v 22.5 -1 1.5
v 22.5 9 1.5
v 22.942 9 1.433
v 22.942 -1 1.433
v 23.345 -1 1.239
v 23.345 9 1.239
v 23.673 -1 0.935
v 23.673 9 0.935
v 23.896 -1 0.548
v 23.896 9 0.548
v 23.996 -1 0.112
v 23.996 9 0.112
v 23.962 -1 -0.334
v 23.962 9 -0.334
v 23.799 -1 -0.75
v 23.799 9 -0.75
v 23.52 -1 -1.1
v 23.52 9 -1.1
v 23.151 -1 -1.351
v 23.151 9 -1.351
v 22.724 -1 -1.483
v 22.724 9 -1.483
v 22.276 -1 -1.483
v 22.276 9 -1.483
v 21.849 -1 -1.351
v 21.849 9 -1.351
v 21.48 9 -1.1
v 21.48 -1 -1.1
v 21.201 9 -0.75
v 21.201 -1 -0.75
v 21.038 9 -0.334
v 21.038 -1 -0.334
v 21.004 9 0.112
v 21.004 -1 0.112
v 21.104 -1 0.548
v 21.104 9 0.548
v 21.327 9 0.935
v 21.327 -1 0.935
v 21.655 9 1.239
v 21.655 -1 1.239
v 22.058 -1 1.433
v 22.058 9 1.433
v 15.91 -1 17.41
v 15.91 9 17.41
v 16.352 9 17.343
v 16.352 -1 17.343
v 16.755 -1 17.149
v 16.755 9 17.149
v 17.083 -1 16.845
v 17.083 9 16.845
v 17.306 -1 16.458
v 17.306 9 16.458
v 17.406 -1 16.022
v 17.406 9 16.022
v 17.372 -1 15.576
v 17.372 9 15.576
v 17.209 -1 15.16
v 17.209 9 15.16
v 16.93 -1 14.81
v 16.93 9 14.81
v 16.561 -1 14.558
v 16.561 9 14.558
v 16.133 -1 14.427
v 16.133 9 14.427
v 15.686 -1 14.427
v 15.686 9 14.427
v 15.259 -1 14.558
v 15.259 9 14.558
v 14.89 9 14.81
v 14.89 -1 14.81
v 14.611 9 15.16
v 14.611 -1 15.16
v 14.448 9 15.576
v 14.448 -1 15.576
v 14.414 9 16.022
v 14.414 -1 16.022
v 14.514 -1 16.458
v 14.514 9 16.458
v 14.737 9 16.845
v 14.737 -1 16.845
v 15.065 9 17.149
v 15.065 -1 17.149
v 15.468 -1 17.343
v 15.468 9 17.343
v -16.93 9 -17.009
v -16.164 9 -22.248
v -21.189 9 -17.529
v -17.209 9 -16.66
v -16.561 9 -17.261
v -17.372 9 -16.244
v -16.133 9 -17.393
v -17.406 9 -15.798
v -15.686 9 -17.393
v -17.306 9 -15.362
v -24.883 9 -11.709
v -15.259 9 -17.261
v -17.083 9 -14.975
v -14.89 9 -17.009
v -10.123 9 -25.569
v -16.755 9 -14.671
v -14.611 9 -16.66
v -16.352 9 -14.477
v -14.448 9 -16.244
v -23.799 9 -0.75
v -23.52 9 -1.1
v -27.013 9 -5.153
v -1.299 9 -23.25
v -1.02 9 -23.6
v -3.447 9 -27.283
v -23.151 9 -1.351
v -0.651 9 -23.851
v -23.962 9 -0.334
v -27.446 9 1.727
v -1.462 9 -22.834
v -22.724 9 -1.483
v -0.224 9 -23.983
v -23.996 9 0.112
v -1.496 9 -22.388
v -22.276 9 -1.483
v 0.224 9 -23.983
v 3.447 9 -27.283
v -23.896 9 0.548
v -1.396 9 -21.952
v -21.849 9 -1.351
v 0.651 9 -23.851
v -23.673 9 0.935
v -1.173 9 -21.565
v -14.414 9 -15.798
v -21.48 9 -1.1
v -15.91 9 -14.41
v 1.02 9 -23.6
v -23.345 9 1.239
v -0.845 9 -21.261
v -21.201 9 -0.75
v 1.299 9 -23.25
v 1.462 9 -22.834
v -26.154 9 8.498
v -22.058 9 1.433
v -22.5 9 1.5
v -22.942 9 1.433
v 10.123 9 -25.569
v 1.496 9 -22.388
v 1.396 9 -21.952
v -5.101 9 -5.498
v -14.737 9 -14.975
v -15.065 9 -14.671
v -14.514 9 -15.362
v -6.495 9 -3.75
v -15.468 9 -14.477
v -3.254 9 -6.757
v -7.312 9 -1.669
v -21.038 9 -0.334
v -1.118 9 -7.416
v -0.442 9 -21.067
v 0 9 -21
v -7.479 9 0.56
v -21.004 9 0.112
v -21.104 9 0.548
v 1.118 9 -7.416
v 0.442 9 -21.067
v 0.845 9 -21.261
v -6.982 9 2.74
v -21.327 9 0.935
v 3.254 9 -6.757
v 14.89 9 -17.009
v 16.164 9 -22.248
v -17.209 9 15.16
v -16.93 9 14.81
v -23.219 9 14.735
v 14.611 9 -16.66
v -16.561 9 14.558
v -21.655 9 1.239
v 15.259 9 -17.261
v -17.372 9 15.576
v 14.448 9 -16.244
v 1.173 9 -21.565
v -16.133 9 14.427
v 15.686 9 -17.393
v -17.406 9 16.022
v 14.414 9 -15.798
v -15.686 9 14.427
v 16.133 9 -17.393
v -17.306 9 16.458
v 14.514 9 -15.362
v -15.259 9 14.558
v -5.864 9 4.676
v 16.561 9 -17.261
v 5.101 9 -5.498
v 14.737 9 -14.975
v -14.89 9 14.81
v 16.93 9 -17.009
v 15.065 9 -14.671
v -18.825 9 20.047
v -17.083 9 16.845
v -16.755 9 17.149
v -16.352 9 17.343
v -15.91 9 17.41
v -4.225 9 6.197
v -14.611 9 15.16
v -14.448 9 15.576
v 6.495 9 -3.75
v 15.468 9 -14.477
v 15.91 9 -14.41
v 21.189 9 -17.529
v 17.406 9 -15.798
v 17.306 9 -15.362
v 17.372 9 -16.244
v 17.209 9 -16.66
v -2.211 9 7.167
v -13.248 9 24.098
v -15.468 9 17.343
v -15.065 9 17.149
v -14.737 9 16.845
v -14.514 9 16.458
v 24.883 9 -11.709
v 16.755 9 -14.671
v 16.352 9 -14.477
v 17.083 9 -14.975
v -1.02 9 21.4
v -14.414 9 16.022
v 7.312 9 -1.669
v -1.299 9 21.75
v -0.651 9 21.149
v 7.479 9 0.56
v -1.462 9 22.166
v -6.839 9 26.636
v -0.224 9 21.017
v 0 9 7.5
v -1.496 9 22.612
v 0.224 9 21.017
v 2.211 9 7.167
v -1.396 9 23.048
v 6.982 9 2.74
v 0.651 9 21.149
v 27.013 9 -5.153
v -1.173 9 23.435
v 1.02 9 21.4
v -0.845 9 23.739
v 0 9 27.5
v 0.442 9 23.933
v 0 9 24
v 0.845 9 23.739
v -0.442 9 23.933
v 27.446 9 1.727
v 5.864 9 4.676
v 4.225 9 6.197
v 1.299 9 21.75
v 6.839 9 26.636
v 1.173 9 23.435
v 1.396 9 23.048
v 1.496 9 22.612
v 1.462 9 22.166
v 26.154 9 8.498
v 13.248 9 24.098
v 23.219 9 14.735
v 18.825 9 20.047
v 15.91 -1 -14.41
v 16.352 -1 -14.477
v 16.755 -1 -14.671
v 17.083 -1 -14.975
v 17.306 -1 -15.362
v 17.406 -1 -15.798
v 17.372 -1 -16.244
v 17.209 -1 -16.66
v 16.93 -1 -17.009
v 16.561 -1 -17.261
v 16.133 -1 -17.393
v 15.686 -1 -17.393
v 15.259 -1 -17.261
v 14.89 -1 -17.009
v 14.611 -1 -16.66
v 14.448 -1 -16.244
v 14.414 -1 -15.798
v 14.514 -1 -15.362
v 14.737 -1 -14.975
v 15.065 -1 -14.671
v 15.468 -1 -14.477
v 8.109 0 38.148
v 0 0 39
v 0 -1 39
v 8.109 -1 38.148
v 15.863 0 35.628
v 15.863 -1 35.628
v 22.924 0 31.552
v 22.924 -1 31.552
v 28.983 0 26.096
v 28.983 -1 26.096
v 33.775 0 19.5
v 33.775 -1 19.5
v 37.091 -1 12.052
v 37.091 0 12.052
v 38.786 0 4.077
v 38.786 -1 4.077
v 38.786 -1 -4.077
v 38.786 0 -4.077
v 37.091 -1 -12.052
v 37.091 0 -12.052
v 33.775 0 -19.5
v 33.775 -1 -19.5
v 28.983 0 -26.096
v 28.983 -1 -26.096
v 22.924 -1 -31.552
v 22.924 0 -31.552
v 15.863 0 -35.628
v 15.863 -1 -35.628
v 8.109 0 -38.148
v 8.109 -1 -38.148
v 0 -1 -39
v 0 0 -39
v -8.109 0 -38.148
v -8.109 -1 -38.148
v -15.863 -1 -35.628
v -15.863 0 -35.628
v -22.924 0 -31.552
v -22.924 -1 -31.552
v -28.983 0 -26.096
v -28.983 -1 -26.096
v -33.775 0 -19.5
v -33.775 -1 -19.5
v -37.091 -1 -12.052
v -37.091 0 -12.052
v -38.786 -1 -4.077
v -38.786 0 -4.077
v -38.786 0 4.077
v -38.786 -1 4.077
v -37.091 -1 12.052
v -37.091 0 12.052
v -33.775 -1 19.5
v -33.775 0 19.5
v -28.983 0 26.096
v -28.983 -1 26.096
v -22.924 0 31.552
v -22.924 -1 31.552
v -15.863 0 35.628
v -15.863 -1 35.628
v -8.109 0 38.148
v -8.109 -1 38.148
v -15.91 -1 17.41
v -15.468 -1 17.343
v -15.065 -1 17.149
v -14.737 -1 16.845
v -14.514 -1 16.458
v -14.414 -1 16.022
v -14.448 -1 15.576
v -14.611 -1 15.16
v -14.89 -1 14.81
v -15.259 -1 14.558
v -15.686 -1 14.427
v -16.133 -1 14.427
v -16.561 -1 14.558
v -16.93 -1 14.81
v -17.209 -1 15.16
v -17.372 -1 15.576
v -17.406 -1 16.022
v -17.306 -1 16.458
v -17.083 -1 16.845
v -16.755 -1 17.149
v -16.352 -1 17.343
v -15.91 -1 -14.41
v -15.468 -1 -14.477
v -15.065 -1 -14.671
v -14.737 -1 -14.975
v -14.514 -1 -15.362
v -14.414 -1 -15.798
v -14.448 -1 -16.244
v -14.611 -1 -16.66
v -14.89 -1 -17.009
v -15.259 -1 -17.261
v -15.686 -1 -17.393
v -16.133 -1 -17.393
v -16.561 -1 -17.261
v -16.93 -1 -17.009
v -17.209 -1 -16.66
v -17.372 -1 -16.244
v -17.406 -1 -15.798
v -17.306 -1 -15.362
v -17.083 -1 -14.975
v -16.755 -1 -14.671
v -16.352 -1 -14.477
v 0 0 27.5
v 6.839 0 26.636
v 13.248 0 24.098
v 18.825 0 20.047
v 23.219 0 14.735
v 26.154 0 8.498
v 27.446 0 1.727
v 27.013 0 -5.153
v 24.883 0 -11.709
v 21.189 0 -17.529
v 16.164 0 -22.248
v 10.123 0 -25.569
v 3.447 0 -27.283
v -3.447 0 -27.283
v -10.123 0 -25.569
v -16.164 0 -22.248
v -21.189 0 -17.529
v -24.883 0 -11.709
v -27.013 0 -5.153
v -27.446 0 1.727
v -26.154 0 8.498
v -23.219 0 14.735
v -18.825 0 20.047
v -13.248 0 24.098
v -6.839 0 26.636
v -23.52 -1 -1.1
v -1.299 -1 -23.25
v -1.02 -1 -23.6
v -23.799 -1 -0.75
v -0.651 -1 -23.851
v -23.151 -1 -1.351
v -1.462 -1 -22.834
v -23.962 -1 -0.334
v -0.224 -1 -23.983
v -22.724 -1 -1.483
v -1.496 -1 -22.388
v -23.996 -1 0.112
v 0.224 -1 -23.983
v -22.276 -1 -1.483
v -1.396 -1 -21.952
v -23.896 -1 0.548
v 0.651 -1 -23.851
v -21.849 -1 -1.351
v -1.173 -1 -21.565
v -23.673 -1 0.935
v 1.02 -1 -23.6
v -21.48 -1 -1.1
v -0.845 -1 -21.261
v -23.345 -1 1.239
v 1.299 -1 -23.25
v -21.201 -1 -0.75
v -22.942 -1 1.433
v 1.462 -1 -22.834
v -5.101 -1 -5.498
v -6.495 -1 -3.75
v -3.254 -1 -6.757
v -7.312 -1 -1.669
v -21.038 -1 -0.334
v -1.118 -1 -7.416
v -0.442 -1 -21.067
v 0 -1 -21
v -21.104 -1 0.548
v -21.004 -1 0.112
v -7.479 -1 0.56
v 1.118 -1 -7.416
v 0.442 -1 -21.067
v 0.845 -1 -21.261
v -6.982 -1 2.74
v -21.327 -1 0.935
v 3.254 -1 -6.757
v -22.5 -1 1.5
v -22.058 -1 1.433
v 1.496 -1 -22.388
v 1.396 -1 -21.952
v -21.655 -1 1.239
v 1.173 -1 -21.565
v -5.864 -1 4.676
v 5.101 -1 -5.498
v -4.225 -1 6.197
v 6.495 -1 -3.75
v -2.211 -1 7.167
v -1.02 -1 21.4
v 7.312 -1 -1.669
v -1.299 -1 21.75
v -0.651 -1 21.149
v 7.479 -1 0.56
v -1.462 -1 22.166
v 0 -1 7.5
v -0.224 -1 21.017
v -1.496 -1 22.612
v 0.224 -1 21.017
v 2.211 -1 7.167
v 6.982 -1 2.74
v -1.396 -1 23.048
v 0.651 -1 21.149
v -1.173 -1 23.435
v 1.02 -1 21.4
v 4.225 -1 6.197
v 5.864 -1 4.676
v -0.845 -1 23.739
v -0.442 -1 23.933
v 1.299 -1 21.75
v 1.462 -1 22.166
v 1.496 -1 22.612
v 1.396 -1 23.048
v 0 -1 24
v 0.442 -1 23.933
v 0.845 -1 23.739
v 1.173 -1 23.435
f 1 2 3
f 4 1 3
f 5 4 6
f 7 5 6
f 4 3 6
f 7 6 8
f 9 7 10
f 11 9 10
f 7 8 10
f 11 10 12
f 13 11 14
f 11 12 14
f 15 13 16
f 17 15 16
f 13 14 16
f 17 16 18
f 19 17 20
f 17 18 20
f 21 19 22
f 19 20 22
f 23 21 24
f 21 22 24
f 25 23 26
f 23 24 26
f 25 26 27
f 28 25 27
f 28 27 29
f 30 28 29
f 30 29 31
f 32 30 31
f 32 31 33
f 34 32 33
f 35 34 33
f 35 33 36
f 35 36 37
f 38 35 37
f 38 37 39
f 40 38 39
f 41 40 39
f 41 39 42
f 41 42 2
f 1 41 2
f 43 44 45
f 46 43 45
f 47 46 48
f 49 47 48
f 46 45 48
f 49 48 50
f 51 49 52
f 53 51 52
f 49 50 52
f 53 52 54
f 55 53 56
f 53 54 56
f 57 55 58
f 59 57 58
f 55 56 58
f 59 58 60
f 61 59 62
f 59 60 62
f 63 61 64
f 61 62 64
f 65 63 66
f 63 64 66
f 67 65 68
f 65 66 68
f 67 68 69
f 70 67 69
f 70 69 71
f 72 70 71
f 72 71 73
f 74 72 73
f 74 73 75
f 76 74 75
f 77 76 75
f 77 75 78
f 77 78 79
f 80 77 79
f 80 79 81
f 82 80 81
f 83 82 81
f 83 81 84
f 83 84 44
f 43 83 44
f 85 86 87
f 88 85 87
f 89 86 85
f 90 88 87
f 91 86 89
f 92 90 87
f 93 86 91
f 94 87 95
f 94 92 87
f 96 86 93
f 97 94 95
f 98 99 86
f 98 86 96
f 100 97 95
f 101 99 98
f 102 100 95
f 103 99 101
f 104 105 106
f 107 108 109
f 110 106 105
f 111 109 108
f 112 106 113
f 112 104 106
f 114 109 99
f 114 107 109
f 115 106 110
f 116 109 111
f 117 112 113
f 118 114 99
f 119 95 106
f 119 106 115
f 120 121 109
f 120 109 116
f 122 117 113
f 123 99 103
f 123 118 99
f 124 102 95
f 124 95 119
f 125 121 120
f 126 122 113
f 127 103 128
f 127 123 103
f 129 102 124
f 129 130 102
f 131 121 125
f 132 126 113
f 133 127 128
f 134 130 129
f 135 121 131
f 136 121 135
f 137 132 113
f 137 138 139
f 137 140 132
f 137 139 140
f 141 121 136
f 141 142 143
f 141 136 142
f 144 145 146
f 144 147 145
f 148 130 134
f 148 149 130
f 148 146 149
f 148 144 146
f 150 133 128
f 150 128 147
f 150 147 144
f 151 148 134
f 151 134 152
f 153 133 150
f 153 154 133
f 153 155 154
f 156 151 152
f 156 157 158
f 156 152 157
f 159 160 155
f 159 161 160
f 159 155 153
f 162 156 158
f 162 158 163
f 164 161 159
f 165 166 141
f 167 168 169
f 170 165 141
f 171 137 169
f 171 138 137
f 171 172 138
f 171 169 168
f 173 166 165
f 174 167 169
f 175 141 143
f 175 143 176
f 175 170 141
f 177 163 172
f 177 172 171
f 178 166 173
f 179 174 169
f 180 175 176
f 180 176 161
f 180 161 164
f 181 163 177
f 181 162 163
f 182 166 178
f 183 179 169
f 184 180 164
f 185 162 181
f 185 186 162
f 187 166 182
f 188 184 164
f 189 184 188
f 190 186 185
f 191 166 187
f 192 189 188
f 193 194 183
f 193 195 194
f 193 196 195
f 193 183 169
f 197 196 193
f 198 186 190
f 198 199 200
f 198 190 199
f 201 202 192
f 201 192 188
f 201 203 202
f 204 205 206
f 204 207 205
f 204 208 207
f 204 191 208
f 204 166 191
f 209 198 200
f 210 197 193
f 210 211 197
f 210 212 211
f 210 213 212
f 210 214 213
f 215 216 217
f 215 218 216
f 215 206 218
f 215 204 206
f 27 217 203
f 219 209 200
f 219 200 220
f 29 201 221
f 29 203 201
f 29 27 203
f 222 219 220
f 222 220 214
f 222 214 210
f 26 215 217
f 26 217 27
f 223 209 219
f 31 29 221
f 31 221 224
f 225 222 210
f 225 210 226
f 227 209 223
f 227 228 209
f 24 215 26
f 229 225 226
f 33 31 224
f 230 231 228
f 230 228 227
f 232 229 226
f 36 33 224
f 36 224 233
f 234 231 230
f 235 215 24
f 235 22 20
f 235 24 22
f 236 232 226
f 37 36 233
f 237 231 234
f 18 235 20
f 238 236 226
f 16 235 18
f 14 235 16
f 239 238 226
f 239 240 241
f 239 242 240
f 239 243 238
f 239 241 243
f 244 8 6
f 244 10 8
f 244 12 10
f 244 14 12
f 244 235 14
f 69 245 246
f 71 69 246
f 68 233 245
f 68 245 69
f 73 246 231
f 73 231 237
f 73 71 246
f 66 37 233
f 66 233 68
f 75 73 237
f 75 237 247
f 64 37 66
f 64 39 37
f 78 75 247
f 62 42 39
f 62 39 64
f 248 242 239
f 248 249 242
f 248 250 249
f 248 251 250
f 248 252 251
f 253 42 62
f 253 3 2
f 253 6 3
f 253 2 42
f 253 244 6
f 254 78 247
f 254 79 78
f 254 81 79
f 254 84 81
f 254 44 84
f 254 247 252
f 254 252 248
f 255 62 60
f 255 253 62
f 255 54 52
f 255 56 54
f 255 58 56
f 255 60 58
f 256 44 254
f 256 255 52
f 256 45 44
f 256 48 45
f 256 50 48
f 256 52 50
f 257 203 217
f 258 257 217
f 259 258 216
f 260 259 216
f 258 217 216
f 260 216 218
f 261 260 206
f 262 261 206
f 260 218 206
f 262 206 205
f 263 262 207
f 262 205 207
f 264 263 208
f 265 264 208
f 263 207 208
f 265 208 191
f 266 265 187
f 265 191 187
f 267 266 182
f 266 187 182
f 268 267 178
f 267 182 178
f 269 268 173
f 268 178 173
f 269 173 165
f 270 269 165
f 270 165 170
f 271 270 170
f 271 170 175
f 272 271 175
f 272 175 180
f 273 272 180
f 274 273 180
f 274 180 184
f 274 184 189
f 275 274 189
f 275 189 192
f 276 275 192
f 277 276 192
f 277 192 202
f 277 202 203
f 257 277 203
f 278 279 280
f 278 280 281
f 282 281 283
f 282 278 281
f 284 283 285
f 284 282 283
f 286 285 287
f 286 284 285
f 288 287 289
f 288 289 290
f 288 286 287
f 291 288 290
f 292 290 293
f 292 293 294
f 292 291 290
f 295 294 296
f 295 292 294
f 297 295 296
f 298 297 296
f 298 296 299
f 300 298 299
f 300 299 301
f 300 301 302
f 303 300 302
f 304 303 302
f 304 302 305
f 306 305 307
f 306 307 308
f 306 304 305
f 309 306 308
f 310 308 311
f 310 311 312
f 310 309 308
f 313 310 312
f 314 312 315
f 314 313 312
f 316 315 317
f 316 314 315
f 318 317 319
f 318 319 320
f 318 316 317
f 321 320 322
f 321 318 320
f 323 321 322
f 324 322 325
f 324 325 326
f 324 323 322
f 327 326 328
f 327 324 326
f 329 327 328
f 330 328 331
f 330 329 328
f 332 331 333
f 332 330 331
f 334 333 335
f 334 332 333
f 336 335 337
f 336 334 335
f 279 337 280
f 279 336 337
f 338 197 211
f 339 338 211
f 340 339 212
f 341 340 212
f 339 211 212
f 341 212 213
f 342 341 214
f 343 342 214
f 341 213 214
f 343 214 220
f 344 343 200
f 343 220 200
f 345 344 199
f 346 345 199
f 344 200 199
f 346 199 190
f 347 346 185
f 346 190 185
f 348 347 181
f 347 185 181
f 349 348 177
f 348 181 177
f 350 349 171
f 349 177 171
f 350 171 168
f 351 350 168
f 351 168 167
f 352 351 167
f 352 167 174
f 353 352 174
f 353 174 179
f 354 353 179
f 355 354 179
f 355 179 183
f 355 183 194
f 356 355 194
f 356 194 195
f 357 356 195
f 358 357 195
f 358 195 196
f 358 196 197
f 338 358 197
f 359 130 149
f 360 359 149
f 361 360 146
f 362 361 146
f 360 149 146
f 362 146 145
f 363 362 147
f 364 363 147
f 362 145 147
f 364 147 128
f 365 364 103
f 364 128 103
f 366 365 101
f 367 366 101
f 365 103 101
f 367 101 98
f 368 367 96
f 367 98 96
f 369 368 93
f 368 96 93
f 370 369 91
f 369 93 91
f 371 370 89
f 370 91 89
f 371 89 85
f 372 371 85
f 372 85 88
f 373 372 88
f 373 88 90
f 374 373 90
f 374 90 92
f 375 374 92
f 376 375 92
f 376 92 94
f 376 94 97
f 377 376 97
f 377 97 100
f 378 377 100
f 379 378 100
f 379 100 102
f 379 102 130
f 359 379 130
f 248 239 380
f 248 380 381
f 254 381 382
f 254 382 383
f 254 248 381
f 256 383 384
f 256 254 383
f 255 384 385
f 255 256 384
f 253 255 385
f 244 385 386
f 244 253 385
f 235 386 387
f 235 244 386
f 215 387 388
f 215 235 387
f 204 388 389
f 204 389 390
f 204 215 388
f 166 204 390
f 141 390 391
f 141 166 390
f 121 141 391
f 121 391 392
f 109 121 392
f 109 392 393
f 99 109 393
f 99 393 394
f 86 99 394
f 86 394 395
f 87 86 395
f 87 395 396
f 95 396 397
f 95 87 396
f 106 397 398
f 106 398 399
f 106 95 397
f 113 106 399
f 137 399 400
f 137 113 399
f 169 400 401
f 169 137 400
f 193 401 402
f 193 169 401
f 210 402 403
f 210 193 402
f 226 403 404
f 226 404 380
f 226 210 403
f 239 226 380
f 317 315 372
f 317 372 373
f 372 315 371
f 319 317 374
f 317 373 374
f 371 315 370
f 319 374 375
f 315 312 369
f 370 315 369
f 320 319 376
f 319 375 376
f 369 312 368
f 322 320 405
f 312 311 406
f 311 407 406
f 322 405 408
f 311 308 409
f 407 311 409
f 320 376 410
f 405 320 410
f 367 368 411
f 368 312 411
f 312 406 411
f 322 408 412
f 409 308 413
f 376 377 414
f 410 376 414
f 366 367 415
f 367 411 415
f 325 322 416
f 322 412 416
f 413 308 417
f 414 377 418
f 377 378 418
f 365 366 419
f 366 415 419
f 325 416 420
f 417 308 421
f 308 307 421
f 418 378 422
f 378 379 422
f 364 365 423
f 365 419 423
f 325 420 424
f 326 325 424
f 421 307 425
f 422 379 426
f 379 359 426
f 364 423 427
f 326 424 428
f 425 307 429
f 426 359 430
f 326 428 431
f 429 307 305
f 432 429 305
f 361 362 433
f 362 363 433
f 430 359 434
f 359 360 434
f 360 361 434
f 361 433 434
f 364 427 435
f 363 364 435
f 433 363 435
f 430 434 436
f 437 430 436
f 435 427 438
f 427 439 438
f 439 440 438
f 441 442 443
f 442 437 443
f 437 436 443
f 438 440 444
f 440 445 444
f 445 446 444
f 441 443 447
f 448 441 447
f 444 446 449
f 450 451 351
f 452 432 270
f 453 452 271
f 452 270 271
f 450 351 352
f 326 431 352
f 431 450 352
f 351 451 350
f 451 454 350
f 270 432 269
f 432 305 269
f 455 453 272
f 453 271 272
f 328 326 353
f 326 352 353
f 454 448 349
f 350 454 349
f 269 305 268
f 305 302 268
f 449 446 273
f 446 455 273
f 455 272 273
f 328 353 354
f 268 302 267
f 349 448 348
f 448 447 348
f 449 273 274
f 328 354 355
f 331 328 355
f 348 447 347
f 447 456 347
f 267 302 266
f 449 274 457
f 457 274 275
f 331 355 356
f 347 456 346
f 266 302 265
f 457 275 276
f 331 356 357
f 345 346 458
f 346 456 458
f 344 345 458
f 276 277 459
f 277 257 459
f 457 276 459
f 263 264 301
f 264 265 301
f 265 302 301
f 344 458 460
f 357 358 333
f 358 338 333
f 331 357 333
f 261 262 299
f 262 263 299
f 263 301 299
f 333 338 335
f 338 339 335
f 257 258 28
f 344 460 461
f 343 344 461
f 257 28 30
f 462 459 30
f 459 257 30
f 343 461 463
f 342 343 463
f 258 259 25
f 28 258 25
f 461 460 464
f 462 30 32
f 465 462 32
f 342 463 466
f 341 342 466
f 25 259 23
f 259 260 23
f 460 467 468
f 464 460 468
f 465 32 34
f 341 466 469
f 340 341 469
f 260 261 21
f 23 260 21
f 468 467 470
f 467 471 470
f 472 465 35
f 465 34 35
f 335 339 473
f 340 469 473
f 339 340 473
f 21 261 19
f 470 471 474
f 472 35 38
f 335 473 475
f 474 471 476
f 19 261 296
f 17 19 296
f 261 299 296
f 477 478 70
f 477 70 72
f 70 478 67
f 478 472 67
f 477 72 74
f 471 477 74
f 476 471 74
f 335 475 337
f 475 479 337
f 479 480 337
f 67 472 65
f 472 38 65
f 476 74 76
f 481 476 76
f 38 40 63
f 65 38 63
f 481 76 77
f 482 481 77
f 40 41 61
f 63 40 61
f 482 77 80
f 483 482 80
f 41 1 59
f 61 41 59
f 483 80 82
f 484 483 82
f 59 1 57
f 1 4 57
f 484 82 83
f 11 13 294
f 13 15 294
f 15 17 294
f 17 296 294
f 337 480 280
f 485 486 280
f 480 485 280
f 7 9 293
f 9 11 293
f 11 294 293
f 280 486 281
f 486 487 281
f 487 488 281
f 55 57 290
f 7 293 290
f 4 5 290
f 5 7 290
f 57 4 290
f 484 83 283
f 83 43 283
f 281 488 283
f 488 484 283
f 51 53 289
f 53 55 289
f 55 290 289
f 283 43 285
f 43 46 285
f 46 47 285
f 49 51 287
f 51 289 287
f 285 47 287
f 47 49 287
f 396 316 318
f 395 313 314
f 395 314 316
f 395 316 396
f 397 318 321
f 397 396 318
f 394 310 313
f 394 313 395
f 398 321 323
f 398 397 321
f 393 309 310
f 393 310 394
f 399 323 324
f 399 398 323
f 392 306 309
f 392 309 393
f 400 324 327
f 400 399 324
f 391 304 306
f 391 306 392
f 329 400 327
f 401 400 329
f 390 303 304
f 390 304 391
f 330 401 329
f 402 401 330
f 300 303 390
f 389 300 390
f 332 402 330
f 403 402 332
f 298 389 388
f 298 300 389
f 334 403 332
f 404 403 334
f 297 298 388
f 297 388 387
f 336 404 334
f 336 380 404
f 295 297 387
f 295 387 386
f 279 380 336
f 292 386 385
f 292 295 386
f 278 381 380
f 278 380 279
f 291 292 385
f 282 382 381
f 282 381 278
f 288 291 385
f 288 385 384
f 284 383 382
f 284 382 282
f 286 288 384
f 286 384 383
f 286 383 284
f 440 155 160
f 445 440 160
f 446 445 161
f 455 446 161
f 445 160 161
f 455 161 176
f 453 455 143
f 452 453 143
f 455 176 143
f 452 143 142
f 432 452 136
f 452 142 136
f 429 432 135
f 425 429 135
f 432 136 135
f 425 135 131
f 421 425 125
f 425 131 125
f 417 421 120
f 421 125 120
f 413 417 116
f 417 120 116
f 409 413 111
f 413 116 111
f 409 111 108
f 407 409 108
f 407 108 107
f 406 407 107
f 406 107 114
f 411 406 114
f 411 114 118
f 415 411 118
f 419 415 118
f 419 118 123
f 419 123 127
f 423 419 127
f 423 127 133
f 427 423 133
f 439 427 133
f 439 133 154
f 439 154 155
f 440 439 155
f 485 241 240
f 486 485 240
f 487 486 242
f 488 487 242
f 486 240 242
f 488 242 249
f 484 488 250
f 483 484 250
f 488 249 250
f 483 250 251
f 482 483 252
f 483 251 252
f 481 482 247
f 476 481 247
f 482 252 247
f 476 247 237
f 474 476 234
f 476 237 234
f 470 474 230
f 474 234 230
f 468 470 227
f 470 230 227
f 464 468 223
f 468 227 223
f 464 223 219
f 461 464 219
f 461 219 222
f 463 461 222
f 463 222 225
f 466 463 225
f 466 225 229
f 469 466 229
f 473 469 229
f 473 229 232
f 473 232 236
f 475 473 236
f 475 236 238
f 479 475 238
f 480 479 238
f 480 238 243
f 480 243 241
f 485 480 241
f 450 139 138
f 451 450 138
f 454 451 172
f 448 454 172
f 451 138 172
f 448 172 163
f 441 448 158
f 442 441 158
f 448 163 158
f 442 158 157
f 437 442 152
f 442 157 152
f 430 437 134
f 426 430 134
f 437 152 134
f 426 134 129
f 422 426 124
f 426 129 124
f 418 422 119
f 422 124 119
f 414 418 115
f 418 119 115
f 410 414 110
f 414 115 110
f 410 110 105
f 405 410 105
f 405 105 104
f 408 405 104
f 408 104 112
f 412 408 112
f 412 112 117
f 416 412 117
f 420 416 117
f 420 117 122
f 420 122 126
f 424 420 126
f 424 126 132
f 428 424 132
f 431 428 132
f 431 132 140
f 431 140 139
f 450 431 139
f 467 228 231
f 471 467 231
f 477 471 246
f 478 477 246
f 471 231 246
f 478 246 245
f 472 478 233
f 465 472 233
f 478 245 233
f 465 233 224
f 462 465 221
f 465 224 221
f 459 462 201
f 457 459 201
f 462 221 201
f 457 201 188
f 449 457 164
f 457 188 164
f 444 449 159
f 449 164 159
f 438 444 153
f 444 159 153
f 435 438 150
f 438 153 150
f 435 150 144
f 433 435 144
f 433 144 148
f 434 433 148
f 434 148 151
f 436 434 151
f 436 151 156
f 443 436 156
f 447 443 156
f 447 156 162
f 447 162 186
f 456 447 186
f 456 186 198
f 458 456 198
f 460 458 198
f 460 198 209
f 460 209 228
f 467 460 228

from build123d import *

# Parameters (mm, degrees)
SKETCH1_R           = 39
SKETCH1_R_2         = 1.5
SKETCH1_R_3         = 7.5
BOSS_EXTRUDE1_DEPTH = 1
BOSS_EXTRUDE2_START = 9
SKETCH1_3_R         = 27.5
SKETCH1_3_R_2       = 1.5
SKETCH1_3_R_3       = 7.5
BOSS_EXTRUDE2_DEPTH = 9


with BuildPart() as part:
    # Sketch1 → Boss-Extrude1 (new body)
    with BuildSketch(Plane(origin=(0, 0, 0), x_dir=(1, 0, 0), z_dir=(0, 1, 0))):
        Circle(SKETCH1_R)
        with Locations((22.5, 0)):
            Circle(SKETCH1_R_2, mode=Mode.SUBTRACT)
        with Locations((-15.909902577, -15.909902577)):
            Circle(SKETCH1_R_2, mode=Mode.SUBTRACT)
        with Locations((0, -22.5)):
            Circle(SKETCH1_R_2, mode=Mode.SUBTRACT)
        with Locations((15.909902577, -15.909902577)):
            Circle(SKETCH1_R_2, mode=Mode.SUBTRACT)
        with Locations((-22.5, 0)):
            Circle(SKETCH1_R_2, mode=Mode.SUBTRACT)
        with Locations((-15.909902577, 15.909902577)):
            Circle(SKETCH1_R_2, mode=Mode.SUBTRACT)
        with Locations((0, 22.5)):
            Circle(SKETCH1_R_2, mode=Mode.SUBTRACT)
        Circle(SKETCH1_R_3, mode=Mode.SUBTRACT)
        with Locations((15.909902577, 15.909902577)):
            Circle(SKETCH1_R_2, mode=Mode.SUBTRACT)
    extrude(amount=-BOSS_EXTRUDE1_DEPTH)

    # Sketch1<3> → Boss-Extrude2 (add)
    with BuildSketch(Plane(origin=(0, 0, 0), x_dir=(1, 0, 0), z_dir=(0, 1, 0)).offset(BOSS_EXTRUDE2_START)):
        Circle(SKETCH1_3_R)
        with Locations((-15.909902577, -15.909902577)):
            Circle(SKETCH1_3_R_2, mode=Mode.SUBTRACT)
        with Locations((0, -22.5)):
            Circle(SKETCH1_3_R_2, mode=Mode.SUBTRACT)
        with Locations((15.909902577, -15.909902577)):
            Circle(SKETCH1_3_R_2, mode=Mode.SUBTRACT)
        with Locations((-22.5, 0)):
            Circle(SKETCH1_3_R_2, mode=Mode.SUBTRACT)
        with Locations((-15.909902577, 15.909902577)):
            Circle(SKETCH1_3_R_2, mode=Mode.SUBTRACT)
        with Locations((0, 22.5)):
            Circle(SKETCH1_3_R_2, mode=Mode.SUBTRACT)
        Circle(SKETCH1_3_R_3, mode=Mode.SUBTRACT)
        with Locations((15.909902577, 15.909902577)):
            Circle(SKETCH1_3_R_2, mode=Mode.SUBTRACT)
        with Locations((22.5, 0)):
            Circle(SKETCH1_3_R_2, mode=Mode.SUBTRACT)
    extrude(amount=-BOSS_EXTRUDE2_DEPTH)


solid = part.part
